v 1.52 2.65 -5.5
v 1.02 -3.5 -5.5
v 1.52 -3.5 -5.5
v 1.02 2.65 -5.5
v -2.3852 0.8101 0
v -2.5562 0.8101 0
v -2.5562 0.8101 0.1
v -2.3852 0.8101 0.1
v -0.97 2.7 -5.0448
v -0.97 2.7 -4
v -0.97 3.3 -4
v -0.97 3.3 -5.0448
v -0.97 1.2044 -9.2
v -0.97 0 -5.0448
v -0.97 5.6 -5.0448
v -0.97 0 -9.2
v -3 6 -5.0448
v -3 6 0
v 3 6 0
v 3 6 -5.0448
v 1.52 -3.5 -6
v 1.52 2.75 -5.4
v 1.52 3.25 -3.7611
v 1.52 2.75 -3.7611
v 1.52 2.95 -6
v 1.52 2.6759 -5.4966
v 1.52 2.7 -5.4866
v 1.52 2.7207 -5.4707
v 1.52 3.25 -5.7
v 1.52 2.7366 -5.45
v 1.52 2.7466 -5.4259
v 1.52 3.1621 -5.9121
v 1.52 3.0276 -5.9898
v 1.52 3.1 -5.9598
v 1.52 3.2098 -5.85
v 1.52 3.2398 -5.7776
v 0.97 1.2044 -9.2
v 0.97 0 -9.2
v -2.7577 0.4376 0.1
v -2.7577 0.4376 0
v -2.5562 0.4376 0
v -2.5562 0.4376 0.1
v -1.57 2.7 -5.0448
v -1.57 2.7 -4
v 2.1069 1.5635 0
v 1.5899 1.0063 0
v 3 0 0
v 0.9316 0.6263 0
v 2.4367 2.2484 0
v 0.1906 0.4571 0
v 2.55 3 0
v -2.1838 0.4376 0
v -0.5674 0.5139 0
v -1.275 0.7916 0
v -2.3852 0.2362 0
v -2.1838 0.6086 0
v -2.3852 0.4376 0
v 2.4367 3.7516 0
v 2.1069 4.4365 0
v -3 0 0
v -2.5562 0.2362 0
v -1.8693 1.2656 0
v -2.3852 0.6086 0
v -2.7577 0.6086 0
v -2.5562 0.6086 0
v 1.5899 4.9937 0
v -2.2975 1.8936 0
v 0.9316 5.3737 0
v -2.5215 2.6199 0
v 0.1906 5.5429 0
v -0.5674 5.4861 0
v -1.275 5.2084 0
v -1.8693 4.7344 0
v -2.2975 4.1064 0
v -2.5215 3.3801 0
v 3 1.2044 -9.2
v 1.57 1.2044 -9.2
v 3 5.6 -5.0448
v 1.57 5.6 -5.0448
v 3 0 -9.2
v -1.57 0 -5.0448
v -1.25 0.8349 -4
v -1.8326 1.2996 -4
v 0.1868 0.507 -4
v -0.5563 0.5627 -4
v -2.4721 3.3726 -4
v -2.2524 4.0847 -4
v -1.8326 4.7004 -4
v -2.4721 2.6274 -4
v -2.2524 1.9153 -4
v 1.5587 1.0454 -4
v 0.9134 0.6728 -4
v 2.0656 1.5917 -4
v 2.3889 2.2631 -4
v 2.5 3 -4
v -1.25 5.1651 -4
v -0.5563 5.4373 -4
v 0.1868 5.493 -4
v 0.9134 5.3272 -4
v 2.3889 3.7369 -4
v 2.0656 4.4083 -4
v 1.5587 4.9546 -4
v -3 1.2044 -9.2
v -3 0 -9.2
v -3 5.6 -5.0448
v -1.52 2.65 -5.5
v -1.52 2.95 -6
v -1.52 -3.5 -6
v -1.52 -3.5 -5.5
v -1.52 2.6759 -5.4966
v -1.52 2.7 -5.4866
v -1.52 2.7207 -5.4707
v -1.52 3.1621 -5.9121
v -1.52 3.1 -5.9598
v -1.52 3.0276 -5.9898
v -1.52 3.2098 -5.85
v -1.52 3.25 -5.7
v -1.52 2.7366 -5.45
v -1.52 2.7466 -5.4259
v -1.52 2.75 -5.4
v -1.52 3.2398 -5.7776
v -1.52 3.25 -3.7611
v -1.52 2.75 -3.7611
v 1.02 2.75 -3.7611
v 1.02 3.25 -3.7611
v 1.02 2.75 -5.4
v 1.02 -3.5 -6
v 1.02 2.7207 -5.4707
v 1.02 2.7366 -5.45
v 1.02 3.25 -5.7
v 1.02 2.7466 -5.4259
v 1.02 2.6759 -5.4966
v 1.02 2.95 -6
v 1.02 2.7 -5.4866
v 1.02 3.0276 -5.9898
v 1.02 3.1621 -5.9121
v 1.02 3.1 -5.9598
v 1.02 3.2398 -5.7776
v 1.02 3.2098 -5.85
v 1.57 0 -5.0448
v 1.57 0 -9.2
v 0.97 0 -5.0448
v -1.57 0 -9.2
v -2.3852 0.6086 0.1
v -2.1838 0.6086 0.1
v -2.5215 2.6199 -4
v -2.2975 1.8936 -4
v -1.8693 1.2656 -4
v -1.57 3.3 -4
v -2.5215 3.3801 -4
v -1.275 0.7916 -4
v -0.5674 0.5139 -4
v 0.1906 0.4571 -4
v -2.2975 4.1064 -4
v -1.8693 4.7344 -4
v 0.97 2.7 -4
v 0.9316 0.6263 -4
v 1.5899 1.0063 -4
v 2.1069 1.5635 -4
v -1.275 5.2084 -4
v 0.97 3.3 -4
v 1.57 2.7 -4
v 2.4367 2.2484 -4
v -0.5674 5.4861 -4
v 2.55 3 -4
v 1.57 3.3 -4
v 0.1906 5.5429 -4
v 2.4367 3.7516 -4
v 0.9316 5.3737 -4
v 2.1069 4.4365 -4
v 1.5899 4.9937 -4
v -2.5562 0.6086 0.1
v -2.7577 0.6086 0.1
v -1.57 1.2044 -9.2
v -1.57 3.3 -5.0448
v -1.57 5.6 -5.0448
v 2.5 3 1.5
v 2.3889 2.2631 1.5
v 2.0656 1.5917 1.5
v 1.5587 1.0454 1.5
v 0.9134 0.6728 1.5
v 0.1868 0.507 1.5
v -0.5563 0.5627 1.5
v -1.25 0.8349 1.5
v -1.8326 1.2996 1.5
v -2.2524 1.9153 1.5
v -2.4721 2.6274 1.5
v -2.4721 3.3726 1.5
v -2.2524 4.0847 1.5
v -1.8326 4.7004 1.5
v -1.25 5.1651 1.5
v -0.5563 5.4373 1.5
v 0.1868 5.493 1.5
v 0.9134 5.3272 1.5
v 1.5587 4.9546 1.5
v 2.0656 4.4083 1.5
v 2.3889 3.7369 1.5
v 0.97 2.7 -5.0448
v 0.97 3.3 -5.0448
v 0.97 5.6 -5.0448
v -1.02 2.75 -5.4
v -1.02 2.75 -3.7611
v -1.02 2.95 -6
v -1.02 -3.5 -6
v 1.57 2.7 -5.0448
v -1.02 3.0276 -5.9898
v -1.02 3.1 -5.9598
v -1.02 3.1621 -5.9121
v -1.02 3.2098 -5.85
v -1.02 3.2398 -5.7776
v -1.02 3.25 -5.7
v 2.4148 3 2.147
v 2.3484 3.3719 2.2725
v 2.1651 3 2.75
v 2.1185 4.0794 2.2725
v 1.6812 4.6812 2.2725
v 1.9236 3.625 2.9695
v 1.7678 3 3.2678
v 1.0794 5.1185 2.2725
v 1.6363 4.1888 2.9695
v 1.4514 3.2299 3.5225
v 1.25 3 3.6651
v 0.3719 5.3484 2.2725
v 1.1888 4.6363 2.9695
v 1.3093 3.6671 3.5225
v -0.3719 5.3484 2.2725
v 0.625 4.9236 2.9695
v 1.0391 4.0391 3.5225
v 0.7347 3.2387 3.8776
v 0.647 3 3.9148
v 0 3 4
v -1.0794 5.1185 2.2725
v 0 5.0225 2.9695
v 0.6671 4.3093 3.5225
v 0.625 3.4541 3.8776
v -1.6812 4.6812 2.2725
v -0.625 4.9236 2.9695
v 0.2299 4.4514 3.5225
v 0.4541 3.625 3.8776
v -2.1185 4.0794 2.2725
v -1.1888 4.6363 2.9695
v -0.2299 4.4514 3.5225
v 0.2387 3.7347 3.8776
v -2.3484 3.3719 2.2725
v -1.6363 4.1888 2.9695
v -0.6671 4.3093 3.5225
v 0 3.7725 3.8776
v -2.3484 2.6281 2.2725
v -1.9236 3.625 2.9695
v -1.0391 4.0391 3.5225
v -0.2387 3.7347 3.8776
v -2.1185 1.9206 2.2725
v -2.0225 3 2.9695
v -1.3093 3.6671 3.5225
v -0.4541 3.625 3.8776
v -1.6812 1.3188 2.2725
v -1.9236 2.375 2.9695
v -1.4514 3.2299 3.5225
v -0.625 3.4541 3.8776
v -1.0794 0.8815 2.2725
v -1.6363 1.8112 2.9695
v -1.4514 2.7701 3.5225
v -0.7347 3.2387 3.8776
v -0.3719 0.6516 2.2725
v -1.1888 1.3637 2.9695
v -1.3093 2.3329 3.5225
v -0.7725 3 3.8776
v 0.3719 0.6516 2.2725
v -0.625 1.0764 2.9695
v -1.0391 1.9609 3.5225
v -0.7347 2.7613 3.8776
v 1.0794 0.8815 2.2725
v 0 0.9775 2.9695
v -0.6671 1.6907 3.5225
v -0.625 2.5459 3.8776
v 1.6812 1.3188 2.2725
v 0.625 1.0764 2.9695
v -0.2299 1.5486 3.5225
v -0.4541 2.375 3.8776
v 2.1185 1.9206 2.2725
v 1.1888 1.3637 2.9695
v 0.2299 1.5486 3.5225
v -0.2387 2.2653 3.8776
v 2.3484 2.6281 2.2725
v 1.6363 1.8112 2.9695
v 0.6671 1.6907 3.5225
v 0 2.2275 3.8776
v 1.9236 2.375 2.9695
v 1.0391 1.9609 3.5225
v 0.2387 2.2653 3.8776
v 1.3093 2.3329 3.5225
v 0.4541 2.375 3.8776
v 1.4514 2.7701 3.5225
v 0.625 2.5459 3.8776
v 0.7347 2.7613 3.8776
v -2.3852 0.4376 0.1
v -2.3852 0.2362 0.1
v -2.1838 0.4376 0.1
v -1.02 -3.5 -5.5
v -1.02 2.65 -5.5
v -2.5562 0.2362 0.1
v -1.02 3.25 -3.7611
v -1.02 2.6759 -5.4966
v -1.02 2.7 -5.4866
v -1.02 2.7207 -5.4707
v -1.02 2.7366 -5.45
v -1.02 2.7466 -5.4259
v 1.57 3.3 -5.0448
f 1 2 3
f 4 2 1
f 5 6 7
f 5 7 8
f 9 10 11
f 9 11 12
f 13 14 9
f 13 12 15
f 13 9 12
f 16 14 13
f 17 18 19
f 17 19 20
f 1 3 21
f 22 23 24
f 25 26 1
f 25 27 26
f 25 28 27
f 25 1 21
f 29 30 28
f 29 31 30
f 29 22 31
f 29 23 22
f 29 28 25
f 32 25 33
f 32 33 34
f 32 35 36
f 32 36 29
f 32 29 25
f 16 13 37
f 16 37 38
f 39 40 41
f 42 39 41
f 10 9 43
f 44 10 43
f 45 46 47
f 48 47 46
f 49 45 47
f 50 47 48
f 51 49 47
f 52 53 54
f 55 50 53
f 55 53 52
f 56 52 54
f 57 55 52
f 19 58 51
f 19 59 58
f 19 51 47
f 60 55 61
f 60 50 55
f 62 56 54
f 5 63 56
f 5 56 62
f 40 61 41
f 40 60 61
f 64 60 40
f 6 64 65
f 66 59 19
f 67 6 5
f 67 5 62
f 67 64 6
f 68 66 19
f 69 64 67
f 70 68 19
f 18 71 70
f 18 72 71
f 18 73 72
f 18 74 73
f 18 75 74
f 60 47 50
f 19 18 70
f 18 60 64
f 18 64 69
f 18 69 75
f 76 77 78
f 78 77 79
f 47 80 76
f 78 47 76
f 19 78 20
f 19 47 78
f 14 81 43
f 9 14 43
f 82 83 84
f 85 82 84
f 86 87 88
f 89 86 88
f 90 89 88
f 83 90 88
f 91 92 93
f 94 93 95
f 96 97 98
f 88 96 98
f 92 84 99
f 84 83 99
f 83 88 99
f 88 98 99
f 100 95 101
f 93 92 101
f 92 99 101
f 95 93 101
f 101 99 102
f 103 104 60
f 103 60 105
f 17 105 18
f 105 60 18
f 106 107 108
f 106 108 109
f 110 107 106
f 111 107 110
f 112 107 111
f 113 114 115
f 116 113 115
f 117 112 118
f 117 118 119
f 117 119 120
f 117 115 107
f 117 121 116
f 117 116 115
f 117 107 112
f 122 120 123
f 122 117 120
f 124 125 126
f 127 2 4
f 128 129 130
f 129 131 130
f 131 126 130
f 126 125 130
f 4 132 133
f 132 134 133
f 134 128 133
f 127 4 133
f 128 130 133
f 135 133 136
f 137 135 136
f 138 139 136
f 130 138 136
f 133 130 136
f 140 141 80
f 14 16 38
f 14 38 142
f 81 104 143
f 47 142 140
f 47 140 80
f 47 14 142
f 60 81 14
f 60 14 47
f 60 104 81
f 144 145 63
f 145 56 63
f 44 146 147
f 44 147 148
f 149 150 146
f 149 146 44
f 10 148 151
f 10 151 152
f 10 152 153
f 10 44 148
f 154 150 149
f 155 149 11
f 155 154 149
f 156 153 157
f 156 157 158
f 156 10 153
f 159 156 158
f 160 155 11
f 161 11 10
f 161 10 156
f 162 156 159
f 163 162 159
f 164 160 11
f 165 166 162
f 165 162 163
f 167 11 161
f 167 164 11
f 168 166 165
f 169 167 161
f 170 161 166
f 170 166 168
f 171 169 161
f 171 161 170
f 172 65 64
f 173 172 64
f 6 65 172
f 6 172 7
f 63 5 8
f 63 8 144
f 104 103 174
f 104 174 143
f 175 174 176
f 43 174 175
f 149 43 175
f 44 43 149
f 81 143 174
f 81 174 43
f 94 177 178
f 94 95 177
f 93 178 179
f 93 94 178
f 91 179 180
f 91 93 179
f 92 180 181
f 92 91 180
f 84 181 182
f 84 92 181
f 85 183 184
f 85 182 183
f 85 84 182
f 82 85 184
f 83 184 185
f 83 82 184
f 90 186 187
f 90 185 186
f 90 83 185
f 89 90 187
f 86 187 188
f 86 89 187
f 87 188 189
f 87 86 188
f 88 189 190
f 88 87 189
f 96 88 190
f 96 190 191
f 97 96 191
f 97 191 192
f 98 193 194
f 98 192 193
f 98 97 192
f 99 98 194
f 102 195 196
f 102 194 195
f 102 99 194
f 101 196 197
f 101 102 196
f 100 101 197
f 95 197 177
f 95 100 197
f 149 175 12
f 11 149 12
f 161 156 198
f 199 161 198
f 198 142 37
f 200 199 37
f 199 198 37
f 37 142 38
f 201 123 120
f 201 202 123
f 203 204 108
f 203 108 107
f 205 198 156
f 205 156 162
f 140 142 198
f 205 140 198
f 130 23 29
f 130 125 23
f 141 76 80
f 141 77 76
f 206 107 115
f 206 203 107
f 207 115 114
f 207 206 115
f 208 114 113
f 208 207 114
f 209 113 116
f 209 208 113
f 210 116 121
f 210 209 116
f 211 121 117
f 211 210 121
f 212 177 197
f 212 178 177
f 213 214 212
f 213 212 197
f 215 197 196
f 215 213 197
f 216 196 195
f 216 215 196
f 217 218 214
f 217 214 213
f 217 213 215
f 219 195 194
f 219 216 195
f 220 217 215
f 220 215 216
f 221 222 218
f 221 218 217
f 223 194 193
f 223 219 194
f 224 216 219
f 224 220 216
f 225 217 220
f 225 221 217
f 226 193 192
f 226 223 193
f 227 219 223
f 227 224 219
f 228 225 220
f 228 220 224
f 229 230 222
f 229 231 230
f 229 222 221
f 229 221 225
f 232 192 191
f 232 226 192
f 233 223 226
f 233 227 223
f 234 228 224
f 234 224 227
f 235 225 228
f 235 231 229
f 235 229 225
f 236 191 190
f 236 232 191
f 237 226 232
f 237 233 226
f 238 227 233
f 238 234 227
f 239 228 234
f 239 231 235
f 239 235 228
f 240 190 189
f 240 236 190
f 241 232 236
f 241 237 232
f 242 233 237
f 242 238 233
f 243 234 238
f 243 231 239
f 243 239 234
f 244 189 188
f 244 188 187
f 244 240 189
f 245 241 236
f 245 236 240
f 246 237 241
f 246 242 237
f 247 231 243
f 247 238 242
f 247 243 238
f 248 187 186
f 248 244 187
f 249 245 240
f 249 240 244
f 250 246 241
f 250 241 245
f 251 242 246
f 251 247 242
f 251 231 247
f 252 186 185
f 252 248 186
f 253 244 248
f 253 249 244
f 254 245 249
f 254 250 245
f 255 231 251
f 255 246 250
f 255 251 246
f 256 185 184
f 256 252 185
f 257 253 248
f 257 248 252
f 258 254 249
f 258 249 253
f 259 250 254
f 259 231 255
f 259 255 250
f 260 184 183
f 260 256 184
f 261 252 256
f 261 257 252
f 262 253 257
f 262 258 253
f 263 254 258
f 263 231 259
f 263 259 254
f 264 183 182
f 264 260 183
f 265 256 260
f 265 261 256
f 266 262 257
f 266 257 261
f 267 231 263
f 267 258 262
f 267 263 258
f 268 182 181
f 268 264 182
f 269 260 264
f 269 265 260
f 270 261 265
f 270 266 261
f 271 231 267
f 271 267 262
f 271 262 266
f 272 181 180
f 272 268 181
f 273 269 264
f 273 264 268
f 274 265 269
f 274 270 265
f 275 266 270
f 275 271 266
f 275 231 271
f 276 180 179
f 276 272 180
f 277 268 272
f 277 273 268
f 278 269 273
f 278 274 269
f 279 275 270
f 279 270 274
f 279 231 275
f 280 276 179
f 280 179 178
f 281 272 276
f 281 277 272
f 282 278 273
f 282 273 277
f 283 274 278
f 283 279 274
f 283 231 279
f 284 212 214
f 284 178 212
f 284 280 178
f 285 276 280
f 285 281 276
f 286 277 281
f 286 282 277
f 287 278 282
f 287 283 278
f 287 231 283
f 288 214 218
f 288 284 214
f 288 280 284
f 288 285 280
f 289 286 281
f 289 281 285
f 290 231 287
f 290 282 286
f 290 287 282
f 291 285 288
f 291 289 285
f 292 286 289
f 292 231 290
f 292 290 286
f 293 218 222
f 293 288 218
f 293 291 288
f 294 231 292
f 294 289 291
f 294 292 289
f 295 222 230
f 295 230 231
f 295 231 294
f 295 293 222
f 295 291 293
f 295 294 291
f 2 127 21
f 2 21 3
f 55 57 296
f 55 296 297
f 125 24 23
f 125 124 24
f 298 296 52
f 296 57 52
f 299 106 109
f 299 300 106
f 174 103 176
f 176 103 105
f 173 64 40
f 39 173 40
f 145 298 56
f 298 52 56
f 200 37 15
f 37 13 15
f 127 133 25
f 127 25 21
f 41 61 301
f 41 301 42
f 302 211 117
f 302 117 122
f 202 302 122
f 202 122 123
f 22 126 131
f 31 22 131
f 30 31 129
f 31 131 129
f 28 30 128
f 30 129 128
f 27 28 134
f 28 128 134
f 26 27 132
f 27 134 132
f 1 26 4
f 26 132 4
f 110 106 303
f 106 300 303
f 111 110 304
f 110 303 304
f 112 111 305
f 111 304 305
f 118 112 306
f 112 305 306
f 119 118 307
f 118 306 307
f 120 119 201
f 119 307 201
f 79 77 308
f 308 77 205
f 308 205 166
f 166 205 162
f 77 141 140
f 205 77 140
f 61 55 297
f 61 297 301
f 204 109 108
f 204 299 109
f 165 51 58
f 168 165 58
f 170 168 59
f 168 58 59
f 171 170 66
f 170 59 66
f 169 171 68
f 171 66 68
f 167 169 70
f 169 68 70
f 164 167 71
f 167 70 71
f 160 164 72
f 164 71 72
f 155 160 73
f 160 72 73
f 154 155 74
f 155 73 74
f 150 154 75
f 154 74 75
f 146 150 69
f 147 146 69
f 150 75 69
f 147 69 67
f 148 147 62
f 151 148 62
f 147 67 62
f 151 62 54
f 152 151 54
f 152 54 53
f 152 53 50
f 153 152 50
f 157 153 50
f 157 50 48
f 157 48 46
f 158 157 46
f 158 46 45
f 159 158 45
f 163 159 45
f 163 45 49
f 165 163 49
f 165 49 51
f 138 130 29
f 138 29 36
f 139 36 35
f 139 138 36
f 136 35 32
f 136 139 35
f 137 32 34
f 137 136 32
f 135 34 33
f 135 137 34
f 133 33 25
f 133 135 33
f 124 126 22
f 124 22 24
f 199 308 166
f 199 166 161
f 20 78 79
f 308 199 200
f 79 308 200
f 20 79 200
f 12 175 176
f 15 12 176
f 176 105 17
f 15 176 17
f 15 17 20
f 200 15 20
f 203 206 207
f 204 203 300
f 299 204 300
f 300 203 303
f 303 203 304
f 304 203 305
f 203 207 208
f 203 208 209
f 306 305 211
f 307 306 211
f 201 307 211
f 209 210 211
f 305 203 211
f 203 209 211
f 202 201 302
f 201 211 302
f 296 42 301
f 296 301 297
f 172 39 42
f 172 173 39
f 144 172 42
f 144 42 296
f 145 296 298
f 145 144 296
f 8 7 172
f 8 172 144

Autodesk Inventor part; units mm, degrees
ref_plane "YZ Plane" through (0, 0, 0) normal (1, 0, 0) x (0, 1, 0)
ref_plane "XZ Plane" through (0, 0, 0) normal (0, 1, 0) x (-1, 0, 0)
sketch "Эскиз1" plane through (0, 0, 0) normal (1, 0, 0) x (0, 1, 0)
  line L0 (0, 0) -> (6, 0)
  line L1 (6, 0) -> (6, -5.0448)
  line L2 (1.2044, -9.2) -> (0, -9.2)
  line L3 (0, -9.2) -> (0, 0)
  line L4 (1.2044, -9.2) -> (5.6, -5.0448)
  line L5 (5.6, -5.0448) -> (6, -5.0448)
  line L6 (11.4478, 9.2277) -> (11.4478, -15.7017) construction
  line L7 (11.4478, -15.7017) -> (-10.569, -15.7017) construction
  line L8 (-10.569, -15.7017) -> (-10.569, 9.2277) construction
  line L9 (-10.569, 9.2277) -> (11.4478, 9.2277) construction
  dimension "d2" = 0.4
  dimension "d39" = 6
  dimension "d40" = 9.2
extrude "Выдавливание1" add sketch "Эскиз1" along normal mid plane 6
sketch "Эскиз2" plane through (-3, 0, 0) normal (0, 0, 1) x (1, 0, 0)
  line L0 (6, 6) -> (6, 0) construction
  line L1 (0, 0) -> (6, 6) construction
  line L2 (0, 0) -> (6, 0) construction
  line L3 (6, 0) -> (0, 6) construction
  line L4 (6, 6) -> (0, 6) construction
  circle A0 centre (3, 3) radius 2.55
  point P0 (3, 0)
  dimension "d43" = 5.1
extrude "Выдавливание2" cut sketch "Эскиз2" against normal blind 4
sketch "Эскиз3" plane through (-3, 0, -9.2) normal (0, -1, 0) x (1, 0, 0)
  line L0 (6, 4.1552) -> (0, 4.1552) construction
  line L1 (6, 0) -> (0, 0) projected
  line L2 (4.57, 4.1552) -> (3.97, 4.1552)
  line L3 (3.97, 4.1552) -> (3.97, 0)
  line L4 (3.97, 0) -> (4.57, 0)
  line L5 (4.57, 0) -> (4.57, 4.1552)
  line L6 (6, 4.1552) -> (0, 4.1552) construction
  line L7 (3, 4.1552) -> (3, 0) construction
  line L8 (1.43, 4.1552) -> (2.03, 4.1552)
  line L9 (2.03, 4.1552) -> (2.03, 0)
  line L10 (2.03, 0) -> (1.43, 0)
  line L11 (1.43, 0) -> (1.43, 4.1552)
  point P0 (3, 9.2)
  point P1 (4.27, 0)
  point P2 (1.73, 0)
  dimension "d46" = 2.54
  dimension "d47" = 0.6
extrude "Выдавливание3" cut sketch "Эскиз3" against normal through all
sketch "Эскиз5" plane through (3, 6, -5.0448) normal (0, 0, -1) x (-1, 0, 0)
  line L0 (1.43, -4.7956) -> (1.43, -0.4) projected
  line L1 (2.03, -0.4) -> (2.03, -4.7956) projected
  line L2 (1.43, -2.7) -> (2.03, -2.7)
  line L3 (2.03, -2.7) -> (2.03, -3.3)
  line L4 (2.03, -3.3) -> (1.43, -3.3)
  line L5 (1.43, -3.3) -> (1.43, -2.7)
  line L6 (2.03, -6) -> (3.97, -6) construction
  line L7 (0, 0) -> (6, 0) construction
  line L8 (1.73, 0) -> (1.73, -6) construction
  line L9 (1.43, -3.3) -> (2.03, -2.7) construction
  line L10 (2.03, -6) -> (1.43, -6) construction
  line L11 (3, 0) -> (3, -6) construction
  line L12 (4.57, -2.7) -> (3.97, -2.7)
  line L13 (3.97, -2.7) -> (3.97, -3.3)
  line L14 (3.97, -3.3) -> (4.57, -3.3)
  line L15 (4.57, -3.3) -> (4.57, -2.7)
  line L16 (4.57, -3.3) -> (3.97, -2.7) construction
  point P0 (1.73, -3)
  point P1 (1.73, -3)
  point P2 (4.27, -3)
  point P3 (4.27, -3)
  dimension "d50" = 0.6
extrude "Выдавливание4" cut sketch "Эскиз5" against normal through all
sketch "Эскиз6" plane through (0, 3, -4) normal (0, 0, 1) x (1, 0, 0)
  circle A0 centre (0, 0) radius 2.5
  point P0 (0, -3)
  dimension "d53" = 5
extrude "Выдавливание5" add sketch "Эскиз6" along normal blind 8 separate body
fillet "Сопряжение1" radius 2.5 1 edges at (-2.5, 3, 4)
ref_plane "РабПлоскость1" through (1.27, 0, -5.0448) normal (1, 0, 0) x (0, 0, -1)
sketch "Эскиз8" plane through (1.27, 0, -5.0448) normal (1, 0, 0) x (0, 0, -1)
  line L0 (-1.2837, 3.25) -> (0.6552, 3.25)
  line L1 (0.9552, 2.95) -> (0.9552, -3.5)
  line L2 (0.9552, -3.5) -> (0.4552, -3.5)
  line L3 (0.4552, -3.5) -> (0.4552, 2.65)
  line L4 (0.3552, 2.75) -> (-1.2837, 2.75)
  line L5 (-1.2837, 2.75) -> (-1.2837, 3.25)
  line L6 (0, 3.3) -> (-1.0448, 3.3) projected
  line L7 (0, 0) -> (0, 2.7) projected
  line L8 (-5.0448, 0) -> (4.1552, 0) projected
  arc A0 (0.9552, 2.95) -> (0.6552, 3.25) centre (0.6552, 2.95) ccw
  arc A1 (0.4552, 2.65) -> (0.3552, 2.75) centre (0.3552, 2.65) ccw
  line L9 (-5.0448, 6) -> (-5.0448, 0) projected
  point P0 (0.7052, -3.5)
  dimension "d57" = 0.5
  dimension "d58" = 0.05
  dimension "d59" = 0.5
  dimension "d60" = 3.5
  dimension "d61" = 0.3
  dimension "d62" = 0.1
  dimension "d67" = 5.75
extrude "Выдавливание6" add sketch "Эскиз8" along normal mid plane 0.5 separate body
mirror "Зеркальное отражение1" about plane through (0, 0, 0) normal (1, 0, 0) of "Выдавливание6" bodies 3
sketch "Эскиз9" plane through (-3, 0, 0) normal (0, 0, 1) x (1, 0, 0)
  line L0 (0.4438, 0.8101) -> (0.6148, 0.8101)
  line L1 (0.6148, 0.8101) -> (0.6148, 0.2362)
  line L2 (0.6148, 0.2362) -> (0.4438, 0.2362)
  line L3 (0.4438, 0.2362) -> (0.4438, 0.8101)
  line L4 (0.4438, 0.8101) -> (0.6148, 0.2362) construction
  line L5 (0.6148, 0.8101) -> (0.4438, 0.2362) construction
  line L6 (0.2423, 0.4376) -> (0.8162, 0.4376)
  line L7 (0.8162, 0.4376) -> (0.8162, 0.6086)
  line L8 (0.8162, 0.6086) -> (0.2423, 0.6086)
  line L9 (0.2423, 0.6086) -> (0.2423, 0.4376)
  line L10 (0.2423, 0.4376) -> (0.8162, 0.6086) construction
  line L11 (0.8162, 0.4376) -> (0.2423, 0.6086) construction
  point P0 (3, 0)
  point P1 (0.5293, 0.5231)
extrude "Выдавливание7" add sketch "Эскиз9" along normal blind 0.1 bodies 1
properties part number "L-1503CB 1ID"
